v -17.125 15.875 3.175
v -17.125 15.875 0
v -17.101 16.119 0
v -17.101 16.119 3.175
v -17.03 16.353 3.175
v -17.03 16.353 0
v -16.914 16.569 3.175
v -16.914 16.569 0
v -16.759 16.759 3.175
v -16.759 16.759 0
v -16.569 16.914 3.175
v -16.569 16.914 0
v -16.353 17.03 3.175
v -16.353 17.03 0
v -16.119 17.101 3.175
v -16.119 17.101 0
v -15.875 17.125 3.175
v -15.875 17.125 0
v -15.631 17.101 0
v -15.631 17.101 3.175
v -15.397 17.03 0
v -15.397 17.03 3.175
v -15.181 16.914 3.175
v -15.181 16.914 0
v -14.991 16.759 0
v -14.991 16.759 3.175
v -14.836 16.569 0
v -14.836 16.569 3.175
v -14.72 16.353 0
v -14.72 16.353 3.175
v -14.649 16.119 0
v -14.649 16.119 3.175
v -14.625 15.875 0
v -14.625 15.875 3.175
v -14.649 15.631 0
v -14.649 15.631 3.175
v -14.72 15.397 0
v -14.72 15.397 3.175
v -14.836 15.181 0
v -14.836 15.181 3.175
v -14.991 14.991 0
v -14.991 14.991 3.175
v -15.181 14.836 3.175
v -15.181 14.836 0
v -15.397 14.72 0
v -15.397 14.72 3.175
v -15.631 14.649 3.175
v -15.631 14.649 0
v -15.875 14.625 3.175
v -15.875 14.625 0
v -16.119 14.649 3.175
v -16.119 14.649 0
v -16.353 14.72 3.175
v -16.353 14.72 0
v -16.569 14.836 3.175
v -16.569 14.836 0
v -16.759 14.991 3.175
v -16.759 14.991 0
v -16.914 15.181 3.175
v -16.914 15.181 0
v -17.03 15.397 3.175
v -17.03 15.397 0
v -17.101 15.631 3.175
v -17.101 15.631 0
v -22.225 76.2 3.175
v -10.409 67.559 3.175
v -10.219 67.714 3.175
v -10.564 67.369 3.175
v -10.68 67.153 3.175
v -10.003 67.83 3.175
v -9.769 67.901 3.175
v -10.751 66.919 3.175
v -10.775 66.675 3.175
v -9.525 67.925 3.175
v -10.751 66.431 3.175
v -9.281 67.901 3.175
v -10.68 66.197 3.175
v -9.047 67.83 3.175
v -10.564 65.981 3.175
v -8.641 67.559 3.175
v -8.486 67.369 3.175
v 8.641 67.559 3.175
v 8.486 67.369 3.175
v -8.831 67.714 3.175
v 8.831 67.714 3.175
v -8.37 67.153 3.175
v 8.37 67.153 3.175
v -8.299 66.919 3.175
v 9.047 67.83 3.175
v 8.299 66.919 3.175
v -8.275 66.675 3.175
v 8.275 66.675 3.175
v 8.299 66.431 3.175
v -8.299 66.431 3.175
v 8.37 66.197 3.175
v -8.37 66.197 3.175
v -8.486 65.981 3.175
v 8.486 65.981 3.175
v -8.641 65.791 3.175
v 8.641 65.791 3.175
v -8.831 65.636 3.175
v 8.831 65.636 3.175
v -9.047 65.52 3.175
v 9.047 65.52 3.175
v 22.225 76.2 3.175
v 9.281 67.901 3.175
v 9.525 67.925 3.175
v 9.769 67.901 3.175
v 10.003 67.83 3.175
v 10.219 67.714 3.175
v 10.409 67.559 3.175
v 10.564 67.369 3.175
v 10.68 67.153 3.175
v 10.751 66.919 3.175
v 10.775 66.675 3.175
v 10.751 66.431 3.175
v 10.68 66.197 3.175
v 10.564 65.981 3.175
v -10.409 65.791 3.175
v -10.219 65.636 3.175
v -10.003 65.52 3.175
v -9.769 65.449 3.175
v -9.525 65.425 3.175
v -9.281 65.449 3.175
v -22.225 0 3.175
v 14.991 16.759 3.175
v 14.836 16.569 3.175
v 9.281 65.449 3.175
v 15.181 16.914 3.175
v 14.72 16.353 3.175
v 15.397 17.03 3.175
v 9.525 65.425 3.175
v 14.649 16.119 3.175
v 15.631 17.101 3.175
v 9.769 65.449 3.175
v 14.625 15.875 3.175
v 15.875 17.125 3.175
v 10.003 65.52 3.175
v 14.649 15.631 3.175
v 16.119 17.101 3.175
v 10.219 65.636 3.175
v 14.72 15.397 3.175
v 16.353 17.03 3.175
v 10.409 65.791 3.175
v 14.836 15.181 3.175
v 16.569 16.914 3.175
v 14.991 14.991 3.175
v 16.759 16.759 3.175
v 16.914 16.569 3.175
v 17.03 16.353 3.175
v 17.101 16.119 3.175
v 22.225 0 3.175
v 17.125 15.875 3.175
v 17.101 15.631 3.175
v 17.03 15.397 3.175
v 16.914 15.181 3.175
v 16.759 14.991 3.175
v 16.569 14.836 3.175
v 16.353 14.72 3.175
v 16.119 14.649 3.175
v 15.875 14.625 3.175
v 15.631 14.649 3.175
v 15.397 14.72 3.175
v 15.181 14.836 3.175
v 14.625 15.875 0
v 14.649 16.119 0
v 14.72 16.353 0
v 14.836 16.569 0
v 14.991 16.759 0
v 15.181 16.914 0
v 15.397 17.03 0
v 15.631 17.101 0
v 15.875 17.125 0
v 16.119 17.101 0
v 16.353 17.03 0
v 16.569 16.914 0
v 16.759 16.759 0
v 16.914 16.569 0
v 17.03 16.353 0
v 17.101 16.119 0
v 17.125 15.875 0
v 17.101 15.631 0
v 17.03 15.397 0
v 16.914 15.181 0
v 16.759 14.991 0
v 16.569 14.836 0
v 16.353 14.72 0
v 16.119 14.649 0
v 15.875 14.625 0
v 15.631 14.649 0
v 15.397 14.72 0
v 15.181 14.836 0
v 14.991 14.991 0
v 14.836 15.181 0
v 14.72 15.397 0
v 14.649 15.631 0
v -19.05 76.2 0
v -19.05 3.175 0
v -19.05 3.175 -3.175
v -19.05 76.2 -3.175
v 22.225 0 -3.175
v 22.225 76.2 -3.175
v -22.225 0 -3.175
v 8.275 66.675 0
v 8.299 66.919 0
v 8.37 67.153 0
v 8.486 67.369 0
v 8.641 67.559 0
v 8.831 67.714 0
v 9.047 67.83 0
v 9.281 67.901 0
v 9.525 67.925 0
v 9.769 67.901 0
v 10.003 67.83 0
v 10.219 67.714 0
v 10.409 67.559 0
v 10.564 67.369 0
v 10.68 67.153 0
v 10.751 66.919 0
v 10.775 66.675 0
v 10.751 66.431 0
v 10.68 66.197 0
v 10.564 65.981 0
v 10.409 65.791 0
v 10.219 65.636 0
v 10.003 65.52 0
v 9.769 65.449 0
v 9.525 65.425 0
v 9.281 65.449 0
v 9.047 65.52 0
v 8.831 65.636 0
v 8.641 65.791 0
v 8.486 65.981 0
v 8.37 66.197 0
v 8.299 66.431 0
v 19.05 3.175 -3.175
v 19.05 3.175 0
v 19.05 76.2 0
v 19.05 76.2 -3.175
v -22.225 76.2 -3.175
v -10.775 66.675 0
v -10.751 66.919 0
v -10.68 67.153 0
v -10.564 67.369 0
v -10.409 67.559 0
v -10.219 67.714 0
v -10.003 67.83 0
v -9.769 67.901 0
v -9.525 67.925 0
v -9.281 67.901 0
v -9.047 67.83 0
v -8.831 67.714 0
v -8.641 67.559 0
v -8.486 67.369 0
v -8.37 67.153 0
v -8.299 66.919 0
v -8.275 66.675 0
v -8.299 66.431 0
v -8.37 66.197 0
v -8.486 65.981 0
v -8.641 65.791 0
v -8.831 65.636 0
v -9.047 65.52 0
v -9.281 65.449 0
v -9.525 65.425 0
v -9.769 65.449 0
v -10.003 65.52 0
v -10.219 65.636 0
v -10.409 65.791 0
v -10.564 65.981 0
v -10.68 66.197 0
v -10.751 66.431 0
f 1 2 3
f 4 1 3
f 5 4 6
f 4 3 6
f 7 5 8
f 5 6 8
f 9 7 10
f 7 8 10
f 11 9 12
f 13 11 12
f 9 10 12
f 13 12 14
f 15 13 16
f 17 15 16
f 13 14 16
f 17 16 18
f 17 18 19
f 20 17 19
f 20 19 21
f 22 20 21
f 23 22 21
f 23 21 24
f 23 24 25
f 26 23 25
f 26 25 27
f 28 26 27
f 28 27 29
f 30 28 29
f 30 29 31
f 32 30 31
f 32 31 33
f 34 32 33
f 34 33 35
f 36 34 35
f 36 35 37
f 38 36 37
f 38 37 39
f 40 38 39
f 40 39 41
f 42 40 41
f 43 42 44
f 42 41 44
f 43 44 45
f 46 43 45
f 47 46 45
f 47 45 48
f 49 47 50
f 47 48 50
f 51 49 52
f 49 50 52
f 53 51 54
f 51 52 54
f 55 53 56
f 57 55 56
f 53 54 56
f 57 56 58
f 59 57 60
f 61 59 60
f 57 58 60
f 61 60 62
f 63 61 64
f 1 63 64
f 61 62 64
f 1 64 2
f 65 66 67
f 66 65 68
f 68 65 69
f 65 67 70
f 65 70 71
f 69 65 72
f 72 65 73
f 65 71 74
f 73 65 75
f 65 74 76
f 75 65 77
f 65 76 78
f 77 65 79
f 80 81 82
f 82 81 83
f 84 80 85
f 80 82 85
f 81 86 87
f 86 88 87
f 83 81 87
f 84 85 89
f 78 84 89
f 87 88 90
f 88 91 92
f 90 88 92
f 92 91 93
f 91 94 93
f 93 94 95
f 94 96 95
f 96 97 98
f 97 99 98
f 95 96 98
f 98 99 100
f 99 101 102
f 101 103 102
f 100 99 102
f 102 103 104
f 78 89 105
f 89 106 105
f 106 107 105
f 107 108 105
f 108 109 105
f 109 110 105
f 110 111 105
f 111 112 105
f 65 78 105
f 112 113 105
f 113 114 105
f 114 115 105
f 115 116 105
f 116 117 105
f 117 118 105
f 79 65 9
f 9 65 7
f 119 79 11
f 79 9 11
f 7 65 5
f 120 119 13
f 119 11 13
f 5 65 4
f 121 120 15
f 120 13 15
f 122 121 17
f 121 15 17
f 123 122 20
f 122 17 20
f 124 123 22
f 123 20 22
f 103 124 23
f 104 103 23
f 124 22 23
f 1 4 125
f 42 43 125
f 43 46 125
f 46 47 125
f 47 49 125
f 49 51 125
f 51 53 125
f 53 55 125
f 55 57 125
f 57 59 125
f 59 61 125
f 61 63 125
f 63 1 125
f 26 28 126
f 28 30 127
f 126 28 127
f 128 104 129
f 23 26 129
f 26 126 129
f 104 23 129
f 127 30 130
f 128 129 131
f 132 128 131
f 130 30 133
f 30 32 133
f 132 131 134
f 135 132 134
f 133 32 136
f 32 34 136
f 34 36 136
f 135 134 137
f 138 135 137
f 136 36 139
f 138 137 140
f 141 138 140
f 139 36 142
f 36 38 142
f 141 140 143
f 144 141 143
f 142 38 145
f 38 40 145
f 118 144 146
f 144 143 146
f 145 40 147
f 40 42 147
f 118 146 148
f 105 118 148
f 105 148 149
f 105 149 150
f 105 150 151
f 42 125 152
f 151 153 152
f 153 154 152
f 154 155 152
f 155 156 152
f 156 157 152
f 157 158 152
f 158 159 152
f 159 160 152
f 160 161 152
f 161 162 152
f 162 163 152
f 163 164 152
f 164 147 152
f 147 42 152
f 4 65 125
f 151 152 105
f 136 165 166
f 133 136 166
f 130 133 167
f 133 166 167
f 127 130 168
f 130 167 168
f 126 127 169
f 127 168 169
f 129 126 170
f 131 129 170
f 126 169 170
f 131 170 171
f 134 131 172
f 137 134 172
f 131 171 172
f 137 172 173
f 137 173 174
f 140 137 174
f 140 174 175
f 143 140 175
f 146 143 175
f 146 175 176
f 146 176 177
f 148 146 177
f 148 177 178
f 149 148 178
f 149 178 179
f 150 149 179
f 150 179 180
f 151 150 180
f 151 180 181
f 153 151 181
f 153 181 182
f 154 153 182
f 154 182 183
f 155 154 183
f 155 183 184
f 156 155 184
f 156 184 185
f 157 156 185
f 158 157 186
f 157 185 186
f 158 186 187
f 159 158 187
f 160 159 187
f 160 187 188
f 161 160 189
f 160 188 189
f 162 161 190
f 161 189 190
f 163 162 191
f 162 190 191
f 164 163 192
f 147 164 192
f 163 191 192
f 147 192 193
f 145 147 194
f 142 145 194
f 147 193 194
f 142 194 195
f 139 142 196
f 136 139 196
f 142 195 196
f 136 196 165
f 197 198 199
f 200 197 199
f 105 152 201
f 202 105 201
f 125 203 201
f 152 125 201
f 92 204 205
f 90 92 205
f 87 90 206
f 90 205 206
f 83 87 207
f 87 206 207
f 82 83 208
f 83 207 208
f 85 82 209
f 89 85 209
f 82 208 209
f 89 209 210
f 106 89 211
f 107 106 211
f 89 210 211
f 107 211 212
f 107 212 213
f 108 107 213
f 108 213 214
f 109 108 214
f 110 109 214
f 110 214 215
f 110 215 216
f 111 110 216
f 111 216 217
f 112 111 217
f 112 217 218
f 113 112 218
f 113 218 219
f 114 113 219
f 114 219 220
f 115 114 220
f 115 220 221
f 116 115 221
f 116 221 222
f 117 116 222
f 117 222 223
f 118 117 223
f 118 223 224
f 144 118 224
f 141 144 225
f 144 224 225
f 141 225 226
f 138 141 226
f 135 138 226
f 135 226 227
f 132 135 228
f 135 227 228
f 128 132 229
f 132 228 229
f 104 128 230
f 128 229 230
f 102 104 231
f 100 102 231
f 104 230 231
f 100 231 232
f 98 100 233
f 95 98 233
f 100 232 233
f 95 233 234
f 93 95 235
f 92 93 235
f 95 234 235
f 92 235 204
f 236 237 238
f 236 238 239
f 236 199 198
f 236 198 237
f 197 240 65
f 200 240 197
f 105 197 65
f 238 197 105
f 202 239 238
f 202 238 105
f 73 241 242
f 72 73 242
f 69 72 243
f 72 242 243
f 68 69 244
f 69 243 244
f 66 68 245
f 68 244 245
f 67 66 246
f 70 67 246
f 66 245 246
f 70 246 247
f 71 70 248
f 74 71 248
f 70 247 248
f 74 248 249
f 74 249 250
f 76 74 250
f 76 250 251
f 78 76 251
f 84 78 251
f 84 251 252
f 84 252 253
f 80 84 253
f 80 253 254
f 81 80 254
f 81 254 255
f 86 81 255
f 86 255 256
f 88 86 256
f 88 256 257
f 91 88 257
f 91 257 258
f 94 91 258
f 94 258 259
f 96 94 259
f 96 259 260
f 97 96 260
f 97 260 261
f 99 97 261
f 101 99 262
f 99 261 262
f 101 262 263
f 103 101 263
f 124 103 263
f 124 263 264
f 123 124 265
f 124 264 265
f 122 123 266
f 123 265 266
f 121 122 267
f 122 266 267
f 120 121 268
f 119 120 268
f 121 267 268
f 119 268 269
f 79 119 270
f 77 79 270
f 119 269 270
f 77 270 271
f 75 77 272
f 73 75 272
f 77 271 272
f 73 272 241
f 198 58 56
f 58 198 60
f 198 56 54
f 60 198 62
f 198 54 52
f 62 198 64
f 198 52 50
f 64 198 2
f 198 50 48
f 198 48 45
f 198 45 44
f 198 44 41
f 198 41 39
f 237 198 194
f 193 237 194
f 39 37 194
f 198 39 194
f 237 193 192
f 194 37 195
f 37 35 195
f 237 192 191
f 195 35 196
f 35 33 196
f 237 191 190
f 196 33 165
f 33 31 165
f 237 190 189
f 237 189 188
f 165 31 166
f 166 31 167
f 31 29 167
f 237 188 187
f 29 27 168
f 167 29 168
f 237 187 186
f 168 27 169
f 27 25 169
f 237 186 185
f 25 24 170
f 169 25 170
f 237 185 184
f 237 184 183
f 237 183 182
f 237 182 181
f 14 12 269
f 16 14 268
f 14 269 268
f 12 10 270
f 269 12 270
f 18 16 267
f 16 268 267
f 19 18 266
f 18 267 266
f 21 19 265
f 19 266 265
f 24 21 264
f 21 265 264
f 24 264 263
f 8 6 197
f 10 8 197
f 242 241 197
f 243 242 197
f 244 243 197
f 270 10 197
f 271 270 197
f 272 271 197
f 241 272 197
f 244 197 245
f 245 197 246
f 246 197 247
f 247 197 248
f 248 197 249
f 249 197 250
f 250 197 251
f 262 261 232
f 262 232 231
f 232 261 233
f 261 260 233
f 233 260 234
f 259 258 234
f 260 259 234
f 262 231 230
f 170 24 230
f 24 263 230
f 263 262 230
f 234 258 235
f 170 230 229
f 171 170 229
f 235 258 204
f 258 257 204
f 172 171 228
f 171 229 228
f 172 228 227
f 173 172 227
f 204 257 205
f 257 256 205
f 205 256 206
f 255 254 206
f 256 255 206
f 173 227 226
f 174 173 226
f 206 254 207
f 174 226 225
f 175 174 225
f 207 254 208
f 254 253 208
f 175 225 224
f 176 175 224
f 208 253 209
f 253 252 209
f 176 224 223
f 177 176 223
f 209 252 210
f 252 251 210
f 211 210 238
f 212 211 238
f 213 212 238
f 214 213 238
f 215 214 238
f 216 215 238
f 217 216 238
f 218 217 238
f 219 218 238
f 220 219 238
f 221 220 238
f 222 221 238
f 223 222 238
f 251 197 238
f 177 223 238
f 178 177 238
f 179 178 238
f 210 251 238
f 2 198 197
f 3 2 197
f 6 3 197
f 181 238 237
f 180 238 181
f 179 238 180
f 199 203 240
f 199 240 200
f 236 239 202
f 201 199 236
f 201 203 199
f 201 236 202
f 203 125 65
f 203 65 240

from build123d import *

# Parameters (mm, degrees)
SKETCH1_W           = 44.45
SKETCH1_H           = 6.35
BOSS_EXTRUDE1_DEPTH = 76.2
SKETCH2_W           = 38.1
SKETCH2_H           = 3.175
CUT_EXTRUDE1_DEPTH  = 73.025
SKETCH4_R           = 1.25
CUT_EXTRUDE2_DEPTH  = 4.175


with BuildPart() as part:
    # Sketch1 → Boss-Extrude1 (new body)
    with BuildSketch(Plane(origin=(0, 0, 0), x_dir=(1, 0, 0), z_dir=(0, 1, 0))):
        Rectangle(SKETCH1_W, SKETCH1_H)
    extrude(amount=BOSS_EXTRUDE1_DEPTH)

    # Sketch2 → Cut-Extrude1 (cut)
    with BuildSketch(Plane(origin=(0, 76.2, 0), x_dir=(1, 0, 0), z_dir=(0, 1, 0))):
        with Locations((0, 1.5875)):
            Rectangle(SKETCH2_W, SKETCH2_H)
    extrude(amount=-CUT_EXTRUDE1_DEPTH, mode=Mode.SUBTRACT)

    # Sketch4 → Cut-Extrude2 (cut, through all)
    with BuildSketch(Plane(origin=(0, 0, 0), x_dir=(-1, 0, 0), z_dir=(0, 0, -1))):
        with Locations((-9.525, 66.675)):
            Circle(SKETCH4_R)
        with Locations((9.525, 66.675)):
            Circle(SKETCH4_R)
        with Locations((-15.875, 15.875)):
            Circle(SKETCH4_R)
        with Locations((15.875, 15.875)):
            Circle(SKETCH4_R)
    extrude(amount=-CUT_EXTRUDE2_DEPTH, mode=Mode.SUBTRACT)


solid = part.part
